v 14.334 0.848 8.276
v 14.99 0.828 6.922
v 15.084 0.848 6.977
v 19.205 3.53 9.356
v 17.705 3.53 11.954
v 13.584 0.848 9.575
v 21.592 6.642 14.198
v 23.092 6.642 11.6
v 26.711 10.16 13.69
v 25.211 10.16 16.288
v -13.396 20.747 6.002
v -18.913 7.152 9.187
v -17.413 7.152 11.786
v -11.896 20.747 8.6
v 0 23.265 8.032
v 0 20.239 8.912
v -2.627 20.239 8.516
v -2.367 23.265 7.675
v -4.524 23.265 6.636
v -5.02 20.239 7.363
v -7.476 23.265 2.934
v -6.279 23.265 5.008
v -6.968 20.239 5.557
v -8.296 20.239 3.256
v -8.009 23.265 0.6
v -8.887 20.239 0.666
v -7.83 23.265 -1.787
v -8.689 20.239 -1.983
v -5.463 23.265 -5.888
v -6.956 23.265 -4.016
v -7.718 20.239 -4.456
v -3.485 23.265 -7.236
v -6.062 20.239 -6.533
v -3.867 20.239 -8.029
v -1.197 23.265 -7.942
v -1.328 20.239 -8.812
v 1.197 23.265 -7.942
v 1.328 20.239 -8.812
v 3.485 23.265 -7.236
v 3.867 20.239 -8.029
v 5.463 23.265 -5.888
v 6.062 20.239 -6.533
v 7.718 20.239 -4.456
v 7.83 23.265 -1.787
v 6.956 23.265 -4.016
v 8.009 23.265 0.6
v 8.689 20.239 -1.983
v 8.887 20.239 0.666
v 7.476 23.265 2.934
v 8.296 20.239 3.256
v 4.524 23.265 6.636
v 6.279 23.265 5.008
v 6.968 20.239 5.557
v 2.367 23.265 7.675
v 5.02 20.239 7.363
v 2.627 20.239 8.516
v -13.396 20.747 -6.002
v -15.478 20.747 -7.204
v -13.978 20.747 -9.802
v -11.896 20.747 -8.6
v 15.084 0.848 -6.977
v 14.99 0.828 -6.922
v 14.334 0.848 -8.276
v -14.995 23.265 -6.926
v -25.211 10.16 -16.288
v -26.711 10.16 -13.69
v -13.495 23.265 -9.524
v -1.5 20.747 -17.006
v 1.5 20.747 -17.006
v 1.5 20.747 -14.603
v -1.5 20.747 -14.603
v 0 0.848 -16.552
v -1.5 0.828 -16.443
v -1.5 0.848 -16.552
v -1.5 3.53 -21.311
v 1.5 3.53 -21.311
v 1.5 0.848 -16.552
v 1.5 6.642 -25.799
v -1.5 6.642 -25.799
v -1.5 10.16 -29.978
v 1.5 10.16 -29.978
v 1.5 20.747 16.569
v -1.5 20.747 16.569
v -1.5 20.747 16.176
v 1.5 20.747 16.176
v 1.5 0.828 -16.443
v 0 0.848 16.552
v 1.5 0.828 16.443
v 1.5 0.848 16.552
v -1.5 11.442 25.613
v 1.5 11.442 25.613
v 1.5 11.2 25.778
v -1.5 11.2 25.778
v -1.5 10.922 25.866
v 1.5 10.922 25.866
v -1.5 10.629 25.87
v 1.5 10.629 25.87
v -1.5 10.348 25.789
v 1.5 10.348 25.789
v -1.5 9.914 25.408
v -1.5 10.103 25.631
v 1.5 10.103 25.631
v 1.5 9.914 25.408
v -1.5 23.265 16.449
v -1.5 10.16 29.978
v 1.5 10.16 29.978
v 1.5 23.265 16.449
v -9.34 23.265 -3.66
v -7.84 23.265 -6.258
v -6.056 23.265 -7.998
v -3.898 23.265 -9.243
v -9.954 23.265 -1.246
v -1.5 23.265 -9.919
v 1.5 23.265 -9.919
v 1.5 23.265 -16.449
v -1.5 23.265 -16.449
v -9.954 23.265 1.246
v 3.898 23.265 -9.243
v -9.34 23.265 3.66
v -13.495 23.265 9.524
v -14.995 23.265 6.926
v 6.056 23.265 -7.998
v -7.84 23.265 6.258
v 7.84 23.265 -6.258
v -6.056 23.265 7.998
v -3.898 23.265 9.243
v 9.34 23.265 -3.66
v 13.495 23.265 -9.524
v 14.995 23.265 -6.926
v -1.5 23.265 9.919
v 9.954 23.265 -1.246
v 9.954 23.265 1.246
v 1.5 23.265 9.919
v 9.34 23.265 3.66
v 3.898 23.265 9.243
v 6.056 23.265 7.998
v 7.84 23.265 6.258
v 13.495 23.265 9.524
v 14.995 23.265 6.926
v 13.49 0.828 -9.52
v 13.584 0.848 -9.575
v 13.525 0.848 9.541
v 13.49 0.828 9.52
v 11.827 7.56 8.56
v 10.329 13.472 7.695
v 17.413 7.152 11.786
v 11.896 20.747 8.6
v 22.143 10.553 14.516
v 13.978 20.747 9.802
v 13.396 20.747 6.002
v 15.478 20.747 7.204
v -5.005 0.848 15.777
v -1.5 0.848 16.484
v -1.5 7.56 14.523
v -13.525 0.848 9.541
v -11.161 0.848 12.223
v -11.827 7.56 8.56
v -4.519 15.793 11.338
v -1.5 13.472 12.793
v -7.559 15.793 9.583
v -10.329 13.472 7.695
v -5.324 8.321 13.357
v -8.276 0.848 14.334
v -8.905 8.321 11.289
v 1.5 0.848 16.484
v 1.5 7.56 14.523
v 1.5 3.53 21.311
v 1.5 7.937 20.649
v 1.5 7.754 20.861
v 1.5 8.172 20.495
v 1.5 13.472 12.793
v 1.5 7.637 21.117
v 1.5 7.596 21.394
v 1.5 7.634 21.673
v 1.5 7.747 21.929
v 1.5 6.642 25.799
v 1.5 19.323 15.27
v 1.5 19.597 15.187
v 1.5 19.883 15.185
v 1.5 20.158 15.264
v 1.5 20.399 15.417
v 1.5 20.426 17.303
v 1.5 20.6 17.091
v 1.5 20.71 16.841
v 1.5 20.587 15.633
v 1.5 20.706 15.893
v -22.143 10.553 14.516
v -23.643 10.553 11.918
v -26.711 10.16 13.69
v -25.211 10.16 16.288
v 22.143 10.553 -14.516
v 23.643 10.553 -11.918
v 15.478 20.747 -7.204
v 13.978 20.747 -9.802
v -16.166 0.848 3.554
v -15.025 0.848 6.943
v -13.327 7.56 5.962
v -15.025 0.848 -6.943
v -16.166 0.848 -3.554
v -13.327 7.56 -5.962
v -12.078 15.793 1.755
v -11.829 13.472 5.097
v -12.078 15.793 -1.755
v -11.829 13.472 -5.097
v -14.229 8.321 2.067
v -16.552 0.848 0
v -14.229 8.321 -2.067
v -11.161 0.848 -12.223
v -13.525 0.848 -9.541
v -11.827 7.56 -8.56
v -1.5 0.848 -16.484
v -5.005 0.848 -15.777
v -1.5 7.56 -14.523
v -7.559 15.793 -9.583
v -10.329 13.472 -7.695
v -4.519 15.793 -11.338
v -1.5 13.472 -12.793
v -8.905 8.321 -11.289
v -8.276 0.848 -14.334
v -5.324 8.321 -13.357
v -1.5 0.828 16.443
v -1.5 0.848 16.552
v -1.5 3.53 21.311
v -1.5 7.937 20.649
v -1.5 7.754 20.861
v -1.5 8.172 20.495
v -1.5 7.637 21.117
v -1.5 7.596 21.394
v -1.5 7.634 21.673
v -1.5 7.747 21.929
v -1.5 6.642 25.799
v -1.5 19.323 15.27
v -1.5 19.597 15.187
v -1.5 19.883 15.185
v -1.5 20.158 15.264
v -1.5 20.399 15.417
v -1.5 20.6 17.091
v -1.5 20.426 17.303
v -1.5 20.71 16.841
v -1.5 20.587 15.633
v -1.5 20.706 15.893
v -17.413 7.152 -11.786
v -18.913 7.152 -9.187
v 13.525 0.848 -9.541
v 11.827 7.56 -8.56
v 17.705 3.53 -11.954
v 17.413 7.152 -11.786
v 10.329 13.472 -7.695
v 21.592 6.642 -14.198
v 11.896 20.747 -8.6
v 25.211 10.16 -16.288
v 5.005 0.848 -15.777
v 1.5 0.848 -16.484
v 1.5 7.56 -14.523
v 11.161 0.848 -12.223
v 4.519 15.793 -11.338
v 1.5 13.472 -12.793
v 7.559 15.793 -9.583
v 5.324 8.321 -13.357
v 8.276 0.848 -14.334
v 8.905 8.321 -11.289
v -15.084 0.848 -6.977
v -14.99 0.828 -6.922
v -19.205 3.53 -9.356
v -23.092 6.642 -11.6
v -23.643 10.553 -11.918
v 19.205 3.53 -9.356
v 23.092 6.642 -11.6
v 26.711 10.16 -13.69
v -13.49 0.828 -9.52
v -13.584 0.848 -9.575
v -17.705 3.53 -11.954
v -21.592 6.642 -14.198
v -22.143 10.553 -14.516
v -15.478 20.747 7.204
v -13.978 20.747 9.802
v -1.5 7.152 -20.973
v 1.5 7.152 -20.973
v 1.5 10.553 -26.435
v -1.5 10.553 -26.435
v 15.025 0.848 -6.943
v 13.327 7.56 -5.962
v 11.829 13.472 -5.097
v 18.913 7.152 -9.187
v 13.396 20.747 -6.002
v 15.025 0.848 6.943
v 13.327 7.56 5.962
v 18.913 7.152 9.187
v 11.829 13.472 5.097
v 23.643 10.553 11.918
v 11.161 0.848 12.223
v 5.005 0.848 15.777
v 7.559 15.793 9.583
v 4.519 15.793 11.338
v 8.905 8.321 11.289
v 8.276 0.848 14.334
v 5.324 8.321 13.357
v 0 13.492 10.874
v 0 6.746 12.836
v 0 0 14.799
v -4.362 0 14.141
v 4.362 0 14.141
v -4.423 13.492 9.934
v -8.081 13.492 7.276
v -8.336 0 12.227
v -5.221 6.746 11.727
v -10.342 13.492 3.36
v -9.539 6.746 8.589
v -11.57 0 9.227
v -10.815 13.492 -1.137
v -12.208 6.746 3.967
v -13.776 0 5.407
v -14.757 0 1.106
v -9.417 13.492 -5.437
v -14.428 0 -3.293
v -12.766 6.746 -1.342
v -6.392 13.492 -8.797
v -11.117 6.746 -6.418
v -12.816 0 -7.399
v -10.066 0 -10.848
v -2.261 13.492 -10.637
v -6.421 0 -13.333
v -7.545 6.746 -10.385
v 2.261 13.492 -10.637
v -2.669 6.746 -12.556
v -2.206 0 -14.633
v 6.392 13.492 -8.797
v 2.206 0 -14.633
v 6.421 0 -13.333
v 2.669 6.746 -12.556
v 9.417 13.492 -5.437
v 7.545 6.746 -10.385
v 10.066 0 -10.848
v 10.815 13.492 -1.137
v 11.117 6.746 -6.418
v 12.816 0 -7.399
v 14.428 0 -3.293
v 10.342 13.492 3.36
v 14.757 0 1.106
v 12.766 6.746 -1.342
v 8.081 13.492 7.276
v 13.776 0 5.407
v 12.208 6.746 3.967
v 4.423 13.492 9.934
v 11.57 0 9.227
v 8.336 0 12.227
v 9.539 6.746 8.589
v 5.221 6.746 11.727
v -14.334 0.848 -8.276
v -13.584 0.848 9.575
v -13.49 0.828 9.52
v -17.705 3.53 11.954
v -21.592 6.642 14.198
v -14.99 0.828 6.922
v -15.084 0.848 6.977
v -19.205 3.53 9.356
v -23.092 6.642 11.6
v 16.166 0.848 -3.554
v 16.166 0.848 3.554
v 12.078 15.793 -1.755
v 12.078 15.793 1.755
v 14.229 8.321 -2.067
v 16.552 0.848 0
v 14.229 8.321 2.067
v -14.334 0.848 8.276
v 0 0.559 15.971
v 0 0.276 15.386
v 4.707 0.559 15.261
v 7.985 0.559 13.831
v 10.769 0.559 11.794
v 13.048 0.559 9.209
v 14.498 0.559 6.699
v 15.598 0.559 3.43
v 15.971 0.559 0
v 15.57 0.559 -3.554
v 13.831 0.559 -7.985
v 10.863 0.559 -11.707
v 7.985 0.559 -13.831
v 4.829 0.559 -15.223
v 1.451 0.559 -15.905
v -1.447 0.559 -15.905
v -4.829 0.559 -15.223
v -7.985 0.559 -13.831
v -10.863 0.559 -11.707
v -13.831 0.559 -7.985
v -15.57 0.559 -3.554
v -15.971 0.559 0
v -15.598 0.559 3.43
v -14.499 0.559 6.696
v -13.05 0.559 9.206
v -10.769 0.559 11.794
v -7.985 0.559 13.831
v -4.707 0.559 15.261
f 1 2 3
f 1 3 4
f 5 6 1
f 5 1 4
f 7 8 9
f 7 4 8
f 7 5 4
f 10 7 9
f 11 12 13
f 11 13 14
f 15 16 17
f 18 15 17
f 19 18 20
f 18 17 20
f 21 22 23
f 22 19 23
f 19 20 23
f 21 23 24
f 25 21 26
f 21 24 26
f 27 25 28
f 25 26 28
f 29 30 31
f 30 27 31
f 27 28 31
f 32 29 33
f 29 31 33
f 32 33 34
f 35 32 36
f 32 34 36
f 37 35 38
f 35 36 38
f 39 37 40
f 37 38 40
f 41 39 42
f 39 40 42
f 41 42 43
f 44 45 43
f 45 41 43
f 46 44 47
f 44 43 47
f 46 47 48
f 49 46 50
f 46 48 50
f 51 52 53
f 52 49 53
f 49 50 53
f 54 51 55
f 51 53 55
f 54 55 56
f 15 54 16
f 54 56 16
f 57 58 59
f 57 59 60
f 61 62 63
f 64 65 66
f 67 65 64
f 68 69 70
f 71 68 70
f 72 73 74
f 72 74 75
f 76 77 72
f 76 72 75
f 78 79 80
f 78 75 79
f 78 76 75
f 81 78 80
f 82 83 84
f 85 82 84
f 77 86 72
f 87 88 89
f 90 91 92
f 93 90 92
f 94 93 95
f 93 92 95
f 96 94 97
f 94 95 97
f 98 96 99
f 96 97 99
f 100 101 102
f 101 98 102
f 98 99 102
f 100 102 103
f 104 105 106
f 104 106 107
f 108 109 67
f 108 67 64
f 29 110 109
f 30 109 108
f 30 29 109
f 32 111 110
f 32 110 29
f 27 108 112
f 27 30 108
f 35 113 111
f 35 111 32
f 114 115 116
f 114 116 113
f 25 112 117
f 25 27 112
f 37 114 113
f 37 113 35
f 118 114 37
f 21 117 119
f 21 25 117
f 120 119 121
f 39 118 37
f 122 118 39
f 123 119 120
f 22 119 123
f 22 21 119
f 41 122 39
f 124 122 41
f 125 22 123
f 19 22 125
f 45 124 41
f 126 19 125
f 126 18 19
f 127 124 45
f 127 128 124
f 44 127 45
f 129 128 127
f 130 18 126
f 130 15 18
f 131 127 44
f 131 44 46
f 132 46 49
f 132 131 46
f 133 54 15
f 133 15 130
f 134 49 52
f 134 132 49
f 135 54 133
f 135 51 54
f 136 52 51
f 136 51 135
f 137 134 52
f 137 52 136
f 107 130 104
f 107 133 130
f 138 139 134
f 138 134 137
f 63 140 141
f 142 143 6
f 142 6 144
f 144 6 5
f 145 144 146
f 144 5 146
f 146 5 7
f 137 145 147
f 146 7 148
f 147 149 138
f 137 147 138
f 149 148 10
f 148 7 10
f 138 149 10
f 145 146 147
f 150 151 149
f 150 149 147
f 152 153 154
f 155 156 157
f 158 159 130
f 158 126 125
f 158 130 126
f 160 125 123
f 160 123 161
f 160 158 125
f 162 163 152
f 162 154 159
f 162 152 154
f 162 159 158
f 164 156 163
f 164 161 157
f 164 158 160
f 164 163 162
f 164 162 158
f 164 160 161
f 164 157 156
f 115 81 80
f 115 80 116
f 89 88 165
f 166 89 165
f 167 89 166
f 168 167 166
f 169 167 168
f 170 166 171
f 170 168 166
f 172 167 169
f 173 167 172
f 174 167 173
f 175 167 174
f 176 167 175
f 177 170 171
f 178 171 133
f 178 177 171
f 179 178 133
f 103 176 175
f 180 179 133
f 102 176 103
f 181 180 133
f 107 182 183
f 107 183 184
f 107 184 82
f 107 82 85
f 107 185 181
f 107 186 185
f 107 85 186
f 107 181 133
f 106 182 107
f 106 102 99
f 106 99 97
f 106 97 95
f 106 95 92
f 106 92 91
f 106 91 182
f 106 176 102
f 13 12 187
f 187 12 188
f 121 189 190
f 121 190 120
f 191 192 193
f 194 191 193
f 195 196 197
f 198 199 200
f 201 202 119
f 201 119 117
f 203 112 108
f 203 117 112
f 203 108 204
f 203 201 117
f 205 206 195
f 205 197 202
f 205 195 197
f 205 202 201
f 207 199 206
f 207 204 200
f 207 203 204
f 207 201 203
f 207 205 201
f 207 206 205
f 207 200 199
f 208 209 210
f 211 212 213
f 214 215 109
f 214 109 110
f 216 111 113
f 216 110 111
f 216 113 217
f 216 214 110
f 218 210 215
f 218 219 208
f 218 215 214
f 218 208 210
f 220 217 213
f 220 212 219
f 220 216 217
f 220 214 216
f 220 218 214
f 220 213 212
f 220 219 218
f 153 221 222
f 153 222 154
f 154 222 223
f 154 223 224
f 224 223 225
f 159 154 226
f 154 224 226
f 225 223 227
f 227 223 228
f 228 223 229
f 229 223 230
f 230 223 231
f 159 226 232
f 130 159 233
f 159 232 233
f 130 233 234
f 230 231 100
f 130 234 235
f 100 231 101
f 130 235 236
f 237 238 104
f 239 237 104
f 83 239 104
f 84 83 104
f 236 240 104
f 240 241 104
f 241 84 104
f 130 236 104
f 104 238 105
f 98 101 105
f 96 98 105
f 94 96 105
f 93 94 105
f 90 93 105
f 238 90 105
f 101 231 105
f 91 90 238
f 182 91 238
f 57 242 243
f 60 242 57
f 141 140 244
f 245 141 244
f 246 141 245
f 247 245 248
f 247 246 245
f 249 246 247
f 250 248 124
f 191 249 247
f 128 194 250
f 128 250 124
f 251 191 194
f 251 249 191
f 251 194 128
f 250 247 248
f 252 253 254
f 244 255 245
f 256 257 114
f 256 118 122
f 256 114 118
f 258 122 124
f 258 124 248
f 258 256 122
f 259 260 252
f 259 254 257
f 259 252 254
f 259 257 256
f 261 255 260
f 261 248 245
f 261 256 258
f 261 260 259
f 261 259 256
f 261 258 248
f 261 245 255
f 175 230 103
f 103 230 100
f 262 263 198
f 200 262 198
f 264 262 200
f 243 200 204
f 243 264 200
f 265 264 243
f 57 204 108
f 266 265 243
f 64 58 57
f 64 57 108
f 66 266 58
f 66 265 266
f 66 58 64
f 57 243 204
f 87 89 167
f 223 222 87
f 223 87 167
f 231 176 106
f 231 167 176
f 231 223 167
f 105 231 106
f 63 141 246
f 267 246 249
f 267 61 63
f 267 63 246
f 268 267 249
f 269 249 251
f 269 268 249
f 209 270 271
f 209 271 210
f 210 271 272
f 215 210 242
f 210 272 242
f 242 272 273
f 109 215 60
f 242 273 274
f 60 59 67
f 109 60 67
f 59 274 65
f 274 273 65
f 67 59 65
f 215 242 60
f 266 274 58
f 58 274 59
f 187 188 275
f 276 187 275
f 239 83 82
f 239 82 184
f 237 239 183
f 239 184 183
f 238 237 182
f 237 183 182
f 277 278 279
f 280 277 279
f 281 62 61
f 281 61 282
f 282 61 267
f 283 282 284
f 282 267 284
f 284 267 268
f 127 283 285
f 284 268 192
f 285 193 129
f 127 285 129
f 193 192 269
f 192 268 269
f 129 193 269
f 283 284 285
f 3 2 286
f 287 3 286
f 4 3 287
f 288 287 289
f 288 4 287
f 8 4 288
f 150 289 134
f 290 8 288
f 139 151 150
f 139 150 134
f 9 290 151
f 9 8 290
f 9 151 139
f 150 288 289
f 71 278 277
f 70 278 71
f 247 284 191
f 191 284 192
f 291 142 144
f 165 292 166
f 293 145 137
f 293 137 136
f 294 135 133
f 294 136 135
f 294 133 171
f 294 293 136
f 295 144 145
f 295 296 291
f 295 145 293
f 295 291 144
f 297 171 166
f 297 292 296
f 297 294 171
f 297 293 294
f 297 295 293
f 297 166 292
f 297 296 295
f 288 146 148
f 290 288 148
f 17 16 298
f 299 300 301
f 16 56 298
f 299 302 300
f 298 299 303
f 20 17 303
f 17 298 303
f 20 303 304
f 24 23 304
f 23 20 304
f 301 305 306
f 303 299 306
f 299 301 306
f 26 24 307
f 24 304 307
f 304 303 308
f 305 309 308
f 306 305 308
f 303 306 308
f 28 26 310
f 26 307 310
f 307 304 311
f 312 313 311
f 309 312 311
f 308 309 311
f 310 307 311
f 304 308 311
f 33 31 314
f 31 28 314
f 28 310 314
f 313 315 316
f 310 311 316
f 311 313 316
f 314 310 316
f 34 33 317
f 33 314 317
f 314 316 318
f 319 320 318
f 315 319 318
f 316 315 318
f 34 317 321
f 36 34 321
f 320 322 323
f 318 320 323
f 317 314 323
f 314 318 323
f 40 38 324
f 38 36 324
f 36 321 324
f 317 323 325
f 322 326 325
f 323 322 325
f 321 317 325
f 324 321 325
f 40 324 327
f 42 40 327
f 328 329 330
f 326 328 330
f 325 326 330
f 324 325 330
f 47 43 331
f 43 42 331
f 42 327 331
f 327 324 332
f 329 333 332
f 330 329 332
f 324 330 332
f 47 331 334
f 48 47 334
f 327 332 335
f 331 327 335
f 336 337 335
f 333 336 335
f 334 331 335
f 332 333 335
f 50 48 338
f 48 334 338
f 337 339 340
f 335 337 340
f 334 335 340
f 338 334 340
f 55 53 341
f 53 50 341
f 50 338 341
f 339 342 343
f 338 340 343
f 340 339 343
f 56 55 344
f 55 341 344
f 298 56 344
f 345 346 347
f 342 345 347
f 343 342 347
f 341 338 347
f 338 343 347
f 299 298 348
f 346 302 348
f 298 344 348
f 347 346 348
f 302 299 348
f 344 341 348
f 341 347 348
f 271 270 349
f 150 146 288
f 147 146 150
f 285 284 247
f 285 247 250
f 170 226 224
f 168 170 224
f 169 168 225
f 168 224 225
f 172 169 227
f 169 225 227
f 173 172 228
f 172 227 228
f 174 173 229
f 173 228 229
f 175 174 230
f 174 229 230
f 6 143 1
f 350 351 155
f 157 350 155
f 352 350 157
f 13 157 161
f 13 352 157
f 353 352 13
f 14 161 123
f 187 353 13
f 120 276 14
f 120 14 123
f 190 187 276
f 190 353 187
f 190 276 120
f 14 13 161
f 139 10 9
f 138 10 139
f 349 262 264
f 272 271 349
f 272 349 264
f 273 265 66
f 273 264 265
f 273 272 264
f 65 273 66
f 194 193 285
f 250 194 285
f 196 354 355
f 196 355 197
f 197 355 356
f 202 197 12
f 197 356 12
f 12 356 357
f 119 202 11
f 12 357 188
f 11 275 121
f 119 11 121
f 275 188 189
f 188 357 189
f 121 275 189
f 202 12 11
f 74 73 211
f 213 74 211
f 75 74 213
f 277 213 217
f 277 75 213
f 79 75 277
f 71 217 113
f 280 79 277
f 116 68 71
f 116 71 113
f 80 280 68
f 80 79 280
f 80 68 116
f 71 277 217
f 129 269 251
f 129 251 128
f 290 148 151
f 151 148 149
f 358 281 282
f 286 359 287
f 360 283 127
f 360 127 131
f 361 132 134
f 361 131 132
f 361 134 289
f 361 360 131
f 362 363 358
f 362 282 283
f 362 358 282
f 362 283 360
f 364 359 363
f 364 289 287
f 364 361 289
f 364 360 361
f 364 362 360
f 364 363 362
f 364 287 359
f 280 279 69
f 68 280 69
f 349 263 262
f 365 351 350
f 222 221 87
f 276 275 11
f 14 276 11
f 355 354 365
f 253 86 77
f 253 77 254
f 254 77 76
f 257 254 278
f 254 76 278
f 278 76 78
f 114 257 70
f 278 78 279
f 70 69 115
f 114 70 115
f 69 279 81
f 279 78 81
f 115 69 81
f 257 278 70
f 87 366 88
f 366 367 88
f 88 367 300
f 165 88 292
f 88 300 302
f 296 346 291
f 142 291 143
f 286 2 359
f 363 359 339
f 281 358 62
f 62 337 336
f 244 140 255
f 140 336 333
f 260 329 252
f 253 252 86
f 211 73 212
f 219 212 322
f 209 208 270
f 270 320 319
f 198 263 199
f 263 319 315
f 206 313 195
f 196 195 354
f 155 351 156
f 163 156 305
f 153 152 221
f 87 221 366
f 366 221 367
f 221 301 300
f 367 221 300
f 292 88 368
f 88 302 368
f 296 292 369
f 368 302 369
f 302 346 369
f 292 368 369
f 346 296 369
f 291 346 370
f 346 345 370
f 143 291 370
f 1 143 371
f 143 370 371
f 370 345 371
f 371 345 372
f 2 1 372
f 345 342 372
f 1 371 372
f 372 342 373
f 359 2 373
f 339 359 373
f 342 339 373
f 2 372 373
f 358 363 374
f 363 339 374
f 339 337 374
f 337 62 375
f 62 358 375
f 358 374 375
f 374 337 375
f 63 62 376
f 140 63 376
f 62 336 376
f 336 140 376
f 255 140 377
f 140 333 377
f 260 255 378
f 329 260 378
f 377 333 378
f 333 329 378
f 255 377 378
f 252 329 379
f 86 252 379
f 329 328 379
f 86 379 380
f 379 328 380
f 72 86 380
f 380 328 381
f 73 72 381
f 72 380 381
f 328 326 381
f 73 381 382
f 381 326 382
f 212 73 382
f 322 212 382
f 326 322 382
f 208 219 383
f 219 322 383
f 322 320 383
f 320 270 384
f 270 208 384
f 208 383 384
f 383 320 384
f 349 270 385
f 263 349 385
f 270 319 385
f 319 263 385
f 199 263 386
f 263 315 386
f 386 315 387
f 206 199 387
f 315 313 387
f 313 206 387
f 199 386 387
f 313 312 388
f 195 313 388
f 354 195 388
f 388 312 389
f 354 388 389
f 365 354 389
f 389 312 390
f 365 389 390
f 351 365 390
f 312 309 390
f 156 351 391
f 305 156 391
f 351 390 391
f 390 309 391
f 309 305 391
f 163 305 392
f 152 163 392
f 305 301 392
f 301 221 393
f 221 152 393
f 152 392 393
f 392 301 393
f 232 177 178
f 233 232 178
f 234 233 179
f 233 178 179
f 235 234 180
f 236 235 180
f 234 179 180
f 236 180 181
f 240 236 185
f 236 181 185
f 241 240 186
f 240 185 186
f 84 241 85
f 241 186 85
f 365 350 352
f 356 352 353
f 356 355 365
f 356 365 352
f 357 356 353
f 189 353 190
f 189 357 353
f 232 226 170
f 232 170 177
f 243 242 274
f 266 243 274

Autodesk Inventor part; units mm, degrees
ref_plane "YZ Plane" through (0, 0, 0) normal (1, 0, 0) x (0, 1, 0)
ref_plane "XZ Plane" through (0, 0, 0) normal (0, 1, 0) x (-1, 0, 0)
ref_plane "XY Plane" through (0, 0, 0) normal (0, 0, 1) x (1, 0, 0)
sketch "Sketch1" plane through (0, 0, 0) normal (1, 0, 0) x (0, 1, 0)
  line L0 (0, 14.7987) -> (0, -14.7987)
  line L1 (20.2387, -8.912) -> (20.2387, 8.912)
  line L2 (0, 14.7987) -> (20.2387, 8.912)
  line L3 (20.2387, 8.912) -> (23.2652, 8.0317)
  line L4 (23.2652, 8.0317) -> (23.2652, 10.0317)
  line L5 (23.2652, 10.0317) -> (0.8483, 16.552)
  arc A0 (10.1758, 29.9776) -> (0, 14.7987) centre (53.1668, -9.8435) ccw
  line L6 (0, 0) -> (4.1623, 0)
  dimension "d0" = 2
  dimension "d1" = 23.3459
  dimension "d2" = 58.5999
  dimension "d3" = 29.5974
  dimension "d4" = 20.2387
  dimension "d5" = 17.8241
  dimension "d6" = 1.7533
revolve "Revolution1" add sketch "Sketch1" angle 360 about axis through (0, 0, 0) along (0, 1, 0)
sketch "Sketch2" plane through (0, 0, 0) normal (1, 0, 0) x (0, 1, 0)
  arc A0 (10.1596, 29.9776) -> (0.8483, 16.552) centre (53.1862, -9.8051) ccw
  line L0 (0.8483, 16.552) -> (23.2652, 10.0317)
  line L1 (23.2652, 9.4492) -> (23.2652, 16.4492)
  line L2 (10.1596, 29.9776) -> (23.2652, 16.4492)
  line L3 (0.8483, -16.552) -> (23.2652, -10.0317) projected
  line L4 (0.8483, 16.552) -> (23.2652, 10.0317) projected
  line L5 (10.5533, 26.4347) -> (20.7474, 17.0064)
  line L6 (7.1516, 20.973) -> (10.5533, 26.4347)
  line L7 (7.1516, 20.973) -> (20.7474, 14.6029)
  line L8 (20.7474, 17.0064) -> (20.7474, 14.6029)
  line L9 (23.2652, 9.4492) -> (0.7694, 16.1344)
  line L10 (0.7694, 16.1344) -> (0.8483, 16.552)
  point P0 (0, 0)
  dimension "d8" = 18.8355
  dimension "d9" = 22.4169
  dimension "d10" = 7
  dimension "d11" = 58.5999
  dimension "d12" = 23.3459
  dimension "d15" = 13.4256
extrude "Extrusion1" add sketch "Sketch2" along normal mid plane 3
fillet "Fillet1" radius 1 4 edges at (0, 10.5533, 26.4347) (0, 7.1516, 20.973) (0, 20.7474, 17.0064) (0, 20.7474, 14.6029)
pattern_circular "Circular Pattern1" count 6 over 360 about axis through (0, 11.6326, 0) along (0, 1, 0) of "Extrusion1"
properties part number "Internal Structure"
